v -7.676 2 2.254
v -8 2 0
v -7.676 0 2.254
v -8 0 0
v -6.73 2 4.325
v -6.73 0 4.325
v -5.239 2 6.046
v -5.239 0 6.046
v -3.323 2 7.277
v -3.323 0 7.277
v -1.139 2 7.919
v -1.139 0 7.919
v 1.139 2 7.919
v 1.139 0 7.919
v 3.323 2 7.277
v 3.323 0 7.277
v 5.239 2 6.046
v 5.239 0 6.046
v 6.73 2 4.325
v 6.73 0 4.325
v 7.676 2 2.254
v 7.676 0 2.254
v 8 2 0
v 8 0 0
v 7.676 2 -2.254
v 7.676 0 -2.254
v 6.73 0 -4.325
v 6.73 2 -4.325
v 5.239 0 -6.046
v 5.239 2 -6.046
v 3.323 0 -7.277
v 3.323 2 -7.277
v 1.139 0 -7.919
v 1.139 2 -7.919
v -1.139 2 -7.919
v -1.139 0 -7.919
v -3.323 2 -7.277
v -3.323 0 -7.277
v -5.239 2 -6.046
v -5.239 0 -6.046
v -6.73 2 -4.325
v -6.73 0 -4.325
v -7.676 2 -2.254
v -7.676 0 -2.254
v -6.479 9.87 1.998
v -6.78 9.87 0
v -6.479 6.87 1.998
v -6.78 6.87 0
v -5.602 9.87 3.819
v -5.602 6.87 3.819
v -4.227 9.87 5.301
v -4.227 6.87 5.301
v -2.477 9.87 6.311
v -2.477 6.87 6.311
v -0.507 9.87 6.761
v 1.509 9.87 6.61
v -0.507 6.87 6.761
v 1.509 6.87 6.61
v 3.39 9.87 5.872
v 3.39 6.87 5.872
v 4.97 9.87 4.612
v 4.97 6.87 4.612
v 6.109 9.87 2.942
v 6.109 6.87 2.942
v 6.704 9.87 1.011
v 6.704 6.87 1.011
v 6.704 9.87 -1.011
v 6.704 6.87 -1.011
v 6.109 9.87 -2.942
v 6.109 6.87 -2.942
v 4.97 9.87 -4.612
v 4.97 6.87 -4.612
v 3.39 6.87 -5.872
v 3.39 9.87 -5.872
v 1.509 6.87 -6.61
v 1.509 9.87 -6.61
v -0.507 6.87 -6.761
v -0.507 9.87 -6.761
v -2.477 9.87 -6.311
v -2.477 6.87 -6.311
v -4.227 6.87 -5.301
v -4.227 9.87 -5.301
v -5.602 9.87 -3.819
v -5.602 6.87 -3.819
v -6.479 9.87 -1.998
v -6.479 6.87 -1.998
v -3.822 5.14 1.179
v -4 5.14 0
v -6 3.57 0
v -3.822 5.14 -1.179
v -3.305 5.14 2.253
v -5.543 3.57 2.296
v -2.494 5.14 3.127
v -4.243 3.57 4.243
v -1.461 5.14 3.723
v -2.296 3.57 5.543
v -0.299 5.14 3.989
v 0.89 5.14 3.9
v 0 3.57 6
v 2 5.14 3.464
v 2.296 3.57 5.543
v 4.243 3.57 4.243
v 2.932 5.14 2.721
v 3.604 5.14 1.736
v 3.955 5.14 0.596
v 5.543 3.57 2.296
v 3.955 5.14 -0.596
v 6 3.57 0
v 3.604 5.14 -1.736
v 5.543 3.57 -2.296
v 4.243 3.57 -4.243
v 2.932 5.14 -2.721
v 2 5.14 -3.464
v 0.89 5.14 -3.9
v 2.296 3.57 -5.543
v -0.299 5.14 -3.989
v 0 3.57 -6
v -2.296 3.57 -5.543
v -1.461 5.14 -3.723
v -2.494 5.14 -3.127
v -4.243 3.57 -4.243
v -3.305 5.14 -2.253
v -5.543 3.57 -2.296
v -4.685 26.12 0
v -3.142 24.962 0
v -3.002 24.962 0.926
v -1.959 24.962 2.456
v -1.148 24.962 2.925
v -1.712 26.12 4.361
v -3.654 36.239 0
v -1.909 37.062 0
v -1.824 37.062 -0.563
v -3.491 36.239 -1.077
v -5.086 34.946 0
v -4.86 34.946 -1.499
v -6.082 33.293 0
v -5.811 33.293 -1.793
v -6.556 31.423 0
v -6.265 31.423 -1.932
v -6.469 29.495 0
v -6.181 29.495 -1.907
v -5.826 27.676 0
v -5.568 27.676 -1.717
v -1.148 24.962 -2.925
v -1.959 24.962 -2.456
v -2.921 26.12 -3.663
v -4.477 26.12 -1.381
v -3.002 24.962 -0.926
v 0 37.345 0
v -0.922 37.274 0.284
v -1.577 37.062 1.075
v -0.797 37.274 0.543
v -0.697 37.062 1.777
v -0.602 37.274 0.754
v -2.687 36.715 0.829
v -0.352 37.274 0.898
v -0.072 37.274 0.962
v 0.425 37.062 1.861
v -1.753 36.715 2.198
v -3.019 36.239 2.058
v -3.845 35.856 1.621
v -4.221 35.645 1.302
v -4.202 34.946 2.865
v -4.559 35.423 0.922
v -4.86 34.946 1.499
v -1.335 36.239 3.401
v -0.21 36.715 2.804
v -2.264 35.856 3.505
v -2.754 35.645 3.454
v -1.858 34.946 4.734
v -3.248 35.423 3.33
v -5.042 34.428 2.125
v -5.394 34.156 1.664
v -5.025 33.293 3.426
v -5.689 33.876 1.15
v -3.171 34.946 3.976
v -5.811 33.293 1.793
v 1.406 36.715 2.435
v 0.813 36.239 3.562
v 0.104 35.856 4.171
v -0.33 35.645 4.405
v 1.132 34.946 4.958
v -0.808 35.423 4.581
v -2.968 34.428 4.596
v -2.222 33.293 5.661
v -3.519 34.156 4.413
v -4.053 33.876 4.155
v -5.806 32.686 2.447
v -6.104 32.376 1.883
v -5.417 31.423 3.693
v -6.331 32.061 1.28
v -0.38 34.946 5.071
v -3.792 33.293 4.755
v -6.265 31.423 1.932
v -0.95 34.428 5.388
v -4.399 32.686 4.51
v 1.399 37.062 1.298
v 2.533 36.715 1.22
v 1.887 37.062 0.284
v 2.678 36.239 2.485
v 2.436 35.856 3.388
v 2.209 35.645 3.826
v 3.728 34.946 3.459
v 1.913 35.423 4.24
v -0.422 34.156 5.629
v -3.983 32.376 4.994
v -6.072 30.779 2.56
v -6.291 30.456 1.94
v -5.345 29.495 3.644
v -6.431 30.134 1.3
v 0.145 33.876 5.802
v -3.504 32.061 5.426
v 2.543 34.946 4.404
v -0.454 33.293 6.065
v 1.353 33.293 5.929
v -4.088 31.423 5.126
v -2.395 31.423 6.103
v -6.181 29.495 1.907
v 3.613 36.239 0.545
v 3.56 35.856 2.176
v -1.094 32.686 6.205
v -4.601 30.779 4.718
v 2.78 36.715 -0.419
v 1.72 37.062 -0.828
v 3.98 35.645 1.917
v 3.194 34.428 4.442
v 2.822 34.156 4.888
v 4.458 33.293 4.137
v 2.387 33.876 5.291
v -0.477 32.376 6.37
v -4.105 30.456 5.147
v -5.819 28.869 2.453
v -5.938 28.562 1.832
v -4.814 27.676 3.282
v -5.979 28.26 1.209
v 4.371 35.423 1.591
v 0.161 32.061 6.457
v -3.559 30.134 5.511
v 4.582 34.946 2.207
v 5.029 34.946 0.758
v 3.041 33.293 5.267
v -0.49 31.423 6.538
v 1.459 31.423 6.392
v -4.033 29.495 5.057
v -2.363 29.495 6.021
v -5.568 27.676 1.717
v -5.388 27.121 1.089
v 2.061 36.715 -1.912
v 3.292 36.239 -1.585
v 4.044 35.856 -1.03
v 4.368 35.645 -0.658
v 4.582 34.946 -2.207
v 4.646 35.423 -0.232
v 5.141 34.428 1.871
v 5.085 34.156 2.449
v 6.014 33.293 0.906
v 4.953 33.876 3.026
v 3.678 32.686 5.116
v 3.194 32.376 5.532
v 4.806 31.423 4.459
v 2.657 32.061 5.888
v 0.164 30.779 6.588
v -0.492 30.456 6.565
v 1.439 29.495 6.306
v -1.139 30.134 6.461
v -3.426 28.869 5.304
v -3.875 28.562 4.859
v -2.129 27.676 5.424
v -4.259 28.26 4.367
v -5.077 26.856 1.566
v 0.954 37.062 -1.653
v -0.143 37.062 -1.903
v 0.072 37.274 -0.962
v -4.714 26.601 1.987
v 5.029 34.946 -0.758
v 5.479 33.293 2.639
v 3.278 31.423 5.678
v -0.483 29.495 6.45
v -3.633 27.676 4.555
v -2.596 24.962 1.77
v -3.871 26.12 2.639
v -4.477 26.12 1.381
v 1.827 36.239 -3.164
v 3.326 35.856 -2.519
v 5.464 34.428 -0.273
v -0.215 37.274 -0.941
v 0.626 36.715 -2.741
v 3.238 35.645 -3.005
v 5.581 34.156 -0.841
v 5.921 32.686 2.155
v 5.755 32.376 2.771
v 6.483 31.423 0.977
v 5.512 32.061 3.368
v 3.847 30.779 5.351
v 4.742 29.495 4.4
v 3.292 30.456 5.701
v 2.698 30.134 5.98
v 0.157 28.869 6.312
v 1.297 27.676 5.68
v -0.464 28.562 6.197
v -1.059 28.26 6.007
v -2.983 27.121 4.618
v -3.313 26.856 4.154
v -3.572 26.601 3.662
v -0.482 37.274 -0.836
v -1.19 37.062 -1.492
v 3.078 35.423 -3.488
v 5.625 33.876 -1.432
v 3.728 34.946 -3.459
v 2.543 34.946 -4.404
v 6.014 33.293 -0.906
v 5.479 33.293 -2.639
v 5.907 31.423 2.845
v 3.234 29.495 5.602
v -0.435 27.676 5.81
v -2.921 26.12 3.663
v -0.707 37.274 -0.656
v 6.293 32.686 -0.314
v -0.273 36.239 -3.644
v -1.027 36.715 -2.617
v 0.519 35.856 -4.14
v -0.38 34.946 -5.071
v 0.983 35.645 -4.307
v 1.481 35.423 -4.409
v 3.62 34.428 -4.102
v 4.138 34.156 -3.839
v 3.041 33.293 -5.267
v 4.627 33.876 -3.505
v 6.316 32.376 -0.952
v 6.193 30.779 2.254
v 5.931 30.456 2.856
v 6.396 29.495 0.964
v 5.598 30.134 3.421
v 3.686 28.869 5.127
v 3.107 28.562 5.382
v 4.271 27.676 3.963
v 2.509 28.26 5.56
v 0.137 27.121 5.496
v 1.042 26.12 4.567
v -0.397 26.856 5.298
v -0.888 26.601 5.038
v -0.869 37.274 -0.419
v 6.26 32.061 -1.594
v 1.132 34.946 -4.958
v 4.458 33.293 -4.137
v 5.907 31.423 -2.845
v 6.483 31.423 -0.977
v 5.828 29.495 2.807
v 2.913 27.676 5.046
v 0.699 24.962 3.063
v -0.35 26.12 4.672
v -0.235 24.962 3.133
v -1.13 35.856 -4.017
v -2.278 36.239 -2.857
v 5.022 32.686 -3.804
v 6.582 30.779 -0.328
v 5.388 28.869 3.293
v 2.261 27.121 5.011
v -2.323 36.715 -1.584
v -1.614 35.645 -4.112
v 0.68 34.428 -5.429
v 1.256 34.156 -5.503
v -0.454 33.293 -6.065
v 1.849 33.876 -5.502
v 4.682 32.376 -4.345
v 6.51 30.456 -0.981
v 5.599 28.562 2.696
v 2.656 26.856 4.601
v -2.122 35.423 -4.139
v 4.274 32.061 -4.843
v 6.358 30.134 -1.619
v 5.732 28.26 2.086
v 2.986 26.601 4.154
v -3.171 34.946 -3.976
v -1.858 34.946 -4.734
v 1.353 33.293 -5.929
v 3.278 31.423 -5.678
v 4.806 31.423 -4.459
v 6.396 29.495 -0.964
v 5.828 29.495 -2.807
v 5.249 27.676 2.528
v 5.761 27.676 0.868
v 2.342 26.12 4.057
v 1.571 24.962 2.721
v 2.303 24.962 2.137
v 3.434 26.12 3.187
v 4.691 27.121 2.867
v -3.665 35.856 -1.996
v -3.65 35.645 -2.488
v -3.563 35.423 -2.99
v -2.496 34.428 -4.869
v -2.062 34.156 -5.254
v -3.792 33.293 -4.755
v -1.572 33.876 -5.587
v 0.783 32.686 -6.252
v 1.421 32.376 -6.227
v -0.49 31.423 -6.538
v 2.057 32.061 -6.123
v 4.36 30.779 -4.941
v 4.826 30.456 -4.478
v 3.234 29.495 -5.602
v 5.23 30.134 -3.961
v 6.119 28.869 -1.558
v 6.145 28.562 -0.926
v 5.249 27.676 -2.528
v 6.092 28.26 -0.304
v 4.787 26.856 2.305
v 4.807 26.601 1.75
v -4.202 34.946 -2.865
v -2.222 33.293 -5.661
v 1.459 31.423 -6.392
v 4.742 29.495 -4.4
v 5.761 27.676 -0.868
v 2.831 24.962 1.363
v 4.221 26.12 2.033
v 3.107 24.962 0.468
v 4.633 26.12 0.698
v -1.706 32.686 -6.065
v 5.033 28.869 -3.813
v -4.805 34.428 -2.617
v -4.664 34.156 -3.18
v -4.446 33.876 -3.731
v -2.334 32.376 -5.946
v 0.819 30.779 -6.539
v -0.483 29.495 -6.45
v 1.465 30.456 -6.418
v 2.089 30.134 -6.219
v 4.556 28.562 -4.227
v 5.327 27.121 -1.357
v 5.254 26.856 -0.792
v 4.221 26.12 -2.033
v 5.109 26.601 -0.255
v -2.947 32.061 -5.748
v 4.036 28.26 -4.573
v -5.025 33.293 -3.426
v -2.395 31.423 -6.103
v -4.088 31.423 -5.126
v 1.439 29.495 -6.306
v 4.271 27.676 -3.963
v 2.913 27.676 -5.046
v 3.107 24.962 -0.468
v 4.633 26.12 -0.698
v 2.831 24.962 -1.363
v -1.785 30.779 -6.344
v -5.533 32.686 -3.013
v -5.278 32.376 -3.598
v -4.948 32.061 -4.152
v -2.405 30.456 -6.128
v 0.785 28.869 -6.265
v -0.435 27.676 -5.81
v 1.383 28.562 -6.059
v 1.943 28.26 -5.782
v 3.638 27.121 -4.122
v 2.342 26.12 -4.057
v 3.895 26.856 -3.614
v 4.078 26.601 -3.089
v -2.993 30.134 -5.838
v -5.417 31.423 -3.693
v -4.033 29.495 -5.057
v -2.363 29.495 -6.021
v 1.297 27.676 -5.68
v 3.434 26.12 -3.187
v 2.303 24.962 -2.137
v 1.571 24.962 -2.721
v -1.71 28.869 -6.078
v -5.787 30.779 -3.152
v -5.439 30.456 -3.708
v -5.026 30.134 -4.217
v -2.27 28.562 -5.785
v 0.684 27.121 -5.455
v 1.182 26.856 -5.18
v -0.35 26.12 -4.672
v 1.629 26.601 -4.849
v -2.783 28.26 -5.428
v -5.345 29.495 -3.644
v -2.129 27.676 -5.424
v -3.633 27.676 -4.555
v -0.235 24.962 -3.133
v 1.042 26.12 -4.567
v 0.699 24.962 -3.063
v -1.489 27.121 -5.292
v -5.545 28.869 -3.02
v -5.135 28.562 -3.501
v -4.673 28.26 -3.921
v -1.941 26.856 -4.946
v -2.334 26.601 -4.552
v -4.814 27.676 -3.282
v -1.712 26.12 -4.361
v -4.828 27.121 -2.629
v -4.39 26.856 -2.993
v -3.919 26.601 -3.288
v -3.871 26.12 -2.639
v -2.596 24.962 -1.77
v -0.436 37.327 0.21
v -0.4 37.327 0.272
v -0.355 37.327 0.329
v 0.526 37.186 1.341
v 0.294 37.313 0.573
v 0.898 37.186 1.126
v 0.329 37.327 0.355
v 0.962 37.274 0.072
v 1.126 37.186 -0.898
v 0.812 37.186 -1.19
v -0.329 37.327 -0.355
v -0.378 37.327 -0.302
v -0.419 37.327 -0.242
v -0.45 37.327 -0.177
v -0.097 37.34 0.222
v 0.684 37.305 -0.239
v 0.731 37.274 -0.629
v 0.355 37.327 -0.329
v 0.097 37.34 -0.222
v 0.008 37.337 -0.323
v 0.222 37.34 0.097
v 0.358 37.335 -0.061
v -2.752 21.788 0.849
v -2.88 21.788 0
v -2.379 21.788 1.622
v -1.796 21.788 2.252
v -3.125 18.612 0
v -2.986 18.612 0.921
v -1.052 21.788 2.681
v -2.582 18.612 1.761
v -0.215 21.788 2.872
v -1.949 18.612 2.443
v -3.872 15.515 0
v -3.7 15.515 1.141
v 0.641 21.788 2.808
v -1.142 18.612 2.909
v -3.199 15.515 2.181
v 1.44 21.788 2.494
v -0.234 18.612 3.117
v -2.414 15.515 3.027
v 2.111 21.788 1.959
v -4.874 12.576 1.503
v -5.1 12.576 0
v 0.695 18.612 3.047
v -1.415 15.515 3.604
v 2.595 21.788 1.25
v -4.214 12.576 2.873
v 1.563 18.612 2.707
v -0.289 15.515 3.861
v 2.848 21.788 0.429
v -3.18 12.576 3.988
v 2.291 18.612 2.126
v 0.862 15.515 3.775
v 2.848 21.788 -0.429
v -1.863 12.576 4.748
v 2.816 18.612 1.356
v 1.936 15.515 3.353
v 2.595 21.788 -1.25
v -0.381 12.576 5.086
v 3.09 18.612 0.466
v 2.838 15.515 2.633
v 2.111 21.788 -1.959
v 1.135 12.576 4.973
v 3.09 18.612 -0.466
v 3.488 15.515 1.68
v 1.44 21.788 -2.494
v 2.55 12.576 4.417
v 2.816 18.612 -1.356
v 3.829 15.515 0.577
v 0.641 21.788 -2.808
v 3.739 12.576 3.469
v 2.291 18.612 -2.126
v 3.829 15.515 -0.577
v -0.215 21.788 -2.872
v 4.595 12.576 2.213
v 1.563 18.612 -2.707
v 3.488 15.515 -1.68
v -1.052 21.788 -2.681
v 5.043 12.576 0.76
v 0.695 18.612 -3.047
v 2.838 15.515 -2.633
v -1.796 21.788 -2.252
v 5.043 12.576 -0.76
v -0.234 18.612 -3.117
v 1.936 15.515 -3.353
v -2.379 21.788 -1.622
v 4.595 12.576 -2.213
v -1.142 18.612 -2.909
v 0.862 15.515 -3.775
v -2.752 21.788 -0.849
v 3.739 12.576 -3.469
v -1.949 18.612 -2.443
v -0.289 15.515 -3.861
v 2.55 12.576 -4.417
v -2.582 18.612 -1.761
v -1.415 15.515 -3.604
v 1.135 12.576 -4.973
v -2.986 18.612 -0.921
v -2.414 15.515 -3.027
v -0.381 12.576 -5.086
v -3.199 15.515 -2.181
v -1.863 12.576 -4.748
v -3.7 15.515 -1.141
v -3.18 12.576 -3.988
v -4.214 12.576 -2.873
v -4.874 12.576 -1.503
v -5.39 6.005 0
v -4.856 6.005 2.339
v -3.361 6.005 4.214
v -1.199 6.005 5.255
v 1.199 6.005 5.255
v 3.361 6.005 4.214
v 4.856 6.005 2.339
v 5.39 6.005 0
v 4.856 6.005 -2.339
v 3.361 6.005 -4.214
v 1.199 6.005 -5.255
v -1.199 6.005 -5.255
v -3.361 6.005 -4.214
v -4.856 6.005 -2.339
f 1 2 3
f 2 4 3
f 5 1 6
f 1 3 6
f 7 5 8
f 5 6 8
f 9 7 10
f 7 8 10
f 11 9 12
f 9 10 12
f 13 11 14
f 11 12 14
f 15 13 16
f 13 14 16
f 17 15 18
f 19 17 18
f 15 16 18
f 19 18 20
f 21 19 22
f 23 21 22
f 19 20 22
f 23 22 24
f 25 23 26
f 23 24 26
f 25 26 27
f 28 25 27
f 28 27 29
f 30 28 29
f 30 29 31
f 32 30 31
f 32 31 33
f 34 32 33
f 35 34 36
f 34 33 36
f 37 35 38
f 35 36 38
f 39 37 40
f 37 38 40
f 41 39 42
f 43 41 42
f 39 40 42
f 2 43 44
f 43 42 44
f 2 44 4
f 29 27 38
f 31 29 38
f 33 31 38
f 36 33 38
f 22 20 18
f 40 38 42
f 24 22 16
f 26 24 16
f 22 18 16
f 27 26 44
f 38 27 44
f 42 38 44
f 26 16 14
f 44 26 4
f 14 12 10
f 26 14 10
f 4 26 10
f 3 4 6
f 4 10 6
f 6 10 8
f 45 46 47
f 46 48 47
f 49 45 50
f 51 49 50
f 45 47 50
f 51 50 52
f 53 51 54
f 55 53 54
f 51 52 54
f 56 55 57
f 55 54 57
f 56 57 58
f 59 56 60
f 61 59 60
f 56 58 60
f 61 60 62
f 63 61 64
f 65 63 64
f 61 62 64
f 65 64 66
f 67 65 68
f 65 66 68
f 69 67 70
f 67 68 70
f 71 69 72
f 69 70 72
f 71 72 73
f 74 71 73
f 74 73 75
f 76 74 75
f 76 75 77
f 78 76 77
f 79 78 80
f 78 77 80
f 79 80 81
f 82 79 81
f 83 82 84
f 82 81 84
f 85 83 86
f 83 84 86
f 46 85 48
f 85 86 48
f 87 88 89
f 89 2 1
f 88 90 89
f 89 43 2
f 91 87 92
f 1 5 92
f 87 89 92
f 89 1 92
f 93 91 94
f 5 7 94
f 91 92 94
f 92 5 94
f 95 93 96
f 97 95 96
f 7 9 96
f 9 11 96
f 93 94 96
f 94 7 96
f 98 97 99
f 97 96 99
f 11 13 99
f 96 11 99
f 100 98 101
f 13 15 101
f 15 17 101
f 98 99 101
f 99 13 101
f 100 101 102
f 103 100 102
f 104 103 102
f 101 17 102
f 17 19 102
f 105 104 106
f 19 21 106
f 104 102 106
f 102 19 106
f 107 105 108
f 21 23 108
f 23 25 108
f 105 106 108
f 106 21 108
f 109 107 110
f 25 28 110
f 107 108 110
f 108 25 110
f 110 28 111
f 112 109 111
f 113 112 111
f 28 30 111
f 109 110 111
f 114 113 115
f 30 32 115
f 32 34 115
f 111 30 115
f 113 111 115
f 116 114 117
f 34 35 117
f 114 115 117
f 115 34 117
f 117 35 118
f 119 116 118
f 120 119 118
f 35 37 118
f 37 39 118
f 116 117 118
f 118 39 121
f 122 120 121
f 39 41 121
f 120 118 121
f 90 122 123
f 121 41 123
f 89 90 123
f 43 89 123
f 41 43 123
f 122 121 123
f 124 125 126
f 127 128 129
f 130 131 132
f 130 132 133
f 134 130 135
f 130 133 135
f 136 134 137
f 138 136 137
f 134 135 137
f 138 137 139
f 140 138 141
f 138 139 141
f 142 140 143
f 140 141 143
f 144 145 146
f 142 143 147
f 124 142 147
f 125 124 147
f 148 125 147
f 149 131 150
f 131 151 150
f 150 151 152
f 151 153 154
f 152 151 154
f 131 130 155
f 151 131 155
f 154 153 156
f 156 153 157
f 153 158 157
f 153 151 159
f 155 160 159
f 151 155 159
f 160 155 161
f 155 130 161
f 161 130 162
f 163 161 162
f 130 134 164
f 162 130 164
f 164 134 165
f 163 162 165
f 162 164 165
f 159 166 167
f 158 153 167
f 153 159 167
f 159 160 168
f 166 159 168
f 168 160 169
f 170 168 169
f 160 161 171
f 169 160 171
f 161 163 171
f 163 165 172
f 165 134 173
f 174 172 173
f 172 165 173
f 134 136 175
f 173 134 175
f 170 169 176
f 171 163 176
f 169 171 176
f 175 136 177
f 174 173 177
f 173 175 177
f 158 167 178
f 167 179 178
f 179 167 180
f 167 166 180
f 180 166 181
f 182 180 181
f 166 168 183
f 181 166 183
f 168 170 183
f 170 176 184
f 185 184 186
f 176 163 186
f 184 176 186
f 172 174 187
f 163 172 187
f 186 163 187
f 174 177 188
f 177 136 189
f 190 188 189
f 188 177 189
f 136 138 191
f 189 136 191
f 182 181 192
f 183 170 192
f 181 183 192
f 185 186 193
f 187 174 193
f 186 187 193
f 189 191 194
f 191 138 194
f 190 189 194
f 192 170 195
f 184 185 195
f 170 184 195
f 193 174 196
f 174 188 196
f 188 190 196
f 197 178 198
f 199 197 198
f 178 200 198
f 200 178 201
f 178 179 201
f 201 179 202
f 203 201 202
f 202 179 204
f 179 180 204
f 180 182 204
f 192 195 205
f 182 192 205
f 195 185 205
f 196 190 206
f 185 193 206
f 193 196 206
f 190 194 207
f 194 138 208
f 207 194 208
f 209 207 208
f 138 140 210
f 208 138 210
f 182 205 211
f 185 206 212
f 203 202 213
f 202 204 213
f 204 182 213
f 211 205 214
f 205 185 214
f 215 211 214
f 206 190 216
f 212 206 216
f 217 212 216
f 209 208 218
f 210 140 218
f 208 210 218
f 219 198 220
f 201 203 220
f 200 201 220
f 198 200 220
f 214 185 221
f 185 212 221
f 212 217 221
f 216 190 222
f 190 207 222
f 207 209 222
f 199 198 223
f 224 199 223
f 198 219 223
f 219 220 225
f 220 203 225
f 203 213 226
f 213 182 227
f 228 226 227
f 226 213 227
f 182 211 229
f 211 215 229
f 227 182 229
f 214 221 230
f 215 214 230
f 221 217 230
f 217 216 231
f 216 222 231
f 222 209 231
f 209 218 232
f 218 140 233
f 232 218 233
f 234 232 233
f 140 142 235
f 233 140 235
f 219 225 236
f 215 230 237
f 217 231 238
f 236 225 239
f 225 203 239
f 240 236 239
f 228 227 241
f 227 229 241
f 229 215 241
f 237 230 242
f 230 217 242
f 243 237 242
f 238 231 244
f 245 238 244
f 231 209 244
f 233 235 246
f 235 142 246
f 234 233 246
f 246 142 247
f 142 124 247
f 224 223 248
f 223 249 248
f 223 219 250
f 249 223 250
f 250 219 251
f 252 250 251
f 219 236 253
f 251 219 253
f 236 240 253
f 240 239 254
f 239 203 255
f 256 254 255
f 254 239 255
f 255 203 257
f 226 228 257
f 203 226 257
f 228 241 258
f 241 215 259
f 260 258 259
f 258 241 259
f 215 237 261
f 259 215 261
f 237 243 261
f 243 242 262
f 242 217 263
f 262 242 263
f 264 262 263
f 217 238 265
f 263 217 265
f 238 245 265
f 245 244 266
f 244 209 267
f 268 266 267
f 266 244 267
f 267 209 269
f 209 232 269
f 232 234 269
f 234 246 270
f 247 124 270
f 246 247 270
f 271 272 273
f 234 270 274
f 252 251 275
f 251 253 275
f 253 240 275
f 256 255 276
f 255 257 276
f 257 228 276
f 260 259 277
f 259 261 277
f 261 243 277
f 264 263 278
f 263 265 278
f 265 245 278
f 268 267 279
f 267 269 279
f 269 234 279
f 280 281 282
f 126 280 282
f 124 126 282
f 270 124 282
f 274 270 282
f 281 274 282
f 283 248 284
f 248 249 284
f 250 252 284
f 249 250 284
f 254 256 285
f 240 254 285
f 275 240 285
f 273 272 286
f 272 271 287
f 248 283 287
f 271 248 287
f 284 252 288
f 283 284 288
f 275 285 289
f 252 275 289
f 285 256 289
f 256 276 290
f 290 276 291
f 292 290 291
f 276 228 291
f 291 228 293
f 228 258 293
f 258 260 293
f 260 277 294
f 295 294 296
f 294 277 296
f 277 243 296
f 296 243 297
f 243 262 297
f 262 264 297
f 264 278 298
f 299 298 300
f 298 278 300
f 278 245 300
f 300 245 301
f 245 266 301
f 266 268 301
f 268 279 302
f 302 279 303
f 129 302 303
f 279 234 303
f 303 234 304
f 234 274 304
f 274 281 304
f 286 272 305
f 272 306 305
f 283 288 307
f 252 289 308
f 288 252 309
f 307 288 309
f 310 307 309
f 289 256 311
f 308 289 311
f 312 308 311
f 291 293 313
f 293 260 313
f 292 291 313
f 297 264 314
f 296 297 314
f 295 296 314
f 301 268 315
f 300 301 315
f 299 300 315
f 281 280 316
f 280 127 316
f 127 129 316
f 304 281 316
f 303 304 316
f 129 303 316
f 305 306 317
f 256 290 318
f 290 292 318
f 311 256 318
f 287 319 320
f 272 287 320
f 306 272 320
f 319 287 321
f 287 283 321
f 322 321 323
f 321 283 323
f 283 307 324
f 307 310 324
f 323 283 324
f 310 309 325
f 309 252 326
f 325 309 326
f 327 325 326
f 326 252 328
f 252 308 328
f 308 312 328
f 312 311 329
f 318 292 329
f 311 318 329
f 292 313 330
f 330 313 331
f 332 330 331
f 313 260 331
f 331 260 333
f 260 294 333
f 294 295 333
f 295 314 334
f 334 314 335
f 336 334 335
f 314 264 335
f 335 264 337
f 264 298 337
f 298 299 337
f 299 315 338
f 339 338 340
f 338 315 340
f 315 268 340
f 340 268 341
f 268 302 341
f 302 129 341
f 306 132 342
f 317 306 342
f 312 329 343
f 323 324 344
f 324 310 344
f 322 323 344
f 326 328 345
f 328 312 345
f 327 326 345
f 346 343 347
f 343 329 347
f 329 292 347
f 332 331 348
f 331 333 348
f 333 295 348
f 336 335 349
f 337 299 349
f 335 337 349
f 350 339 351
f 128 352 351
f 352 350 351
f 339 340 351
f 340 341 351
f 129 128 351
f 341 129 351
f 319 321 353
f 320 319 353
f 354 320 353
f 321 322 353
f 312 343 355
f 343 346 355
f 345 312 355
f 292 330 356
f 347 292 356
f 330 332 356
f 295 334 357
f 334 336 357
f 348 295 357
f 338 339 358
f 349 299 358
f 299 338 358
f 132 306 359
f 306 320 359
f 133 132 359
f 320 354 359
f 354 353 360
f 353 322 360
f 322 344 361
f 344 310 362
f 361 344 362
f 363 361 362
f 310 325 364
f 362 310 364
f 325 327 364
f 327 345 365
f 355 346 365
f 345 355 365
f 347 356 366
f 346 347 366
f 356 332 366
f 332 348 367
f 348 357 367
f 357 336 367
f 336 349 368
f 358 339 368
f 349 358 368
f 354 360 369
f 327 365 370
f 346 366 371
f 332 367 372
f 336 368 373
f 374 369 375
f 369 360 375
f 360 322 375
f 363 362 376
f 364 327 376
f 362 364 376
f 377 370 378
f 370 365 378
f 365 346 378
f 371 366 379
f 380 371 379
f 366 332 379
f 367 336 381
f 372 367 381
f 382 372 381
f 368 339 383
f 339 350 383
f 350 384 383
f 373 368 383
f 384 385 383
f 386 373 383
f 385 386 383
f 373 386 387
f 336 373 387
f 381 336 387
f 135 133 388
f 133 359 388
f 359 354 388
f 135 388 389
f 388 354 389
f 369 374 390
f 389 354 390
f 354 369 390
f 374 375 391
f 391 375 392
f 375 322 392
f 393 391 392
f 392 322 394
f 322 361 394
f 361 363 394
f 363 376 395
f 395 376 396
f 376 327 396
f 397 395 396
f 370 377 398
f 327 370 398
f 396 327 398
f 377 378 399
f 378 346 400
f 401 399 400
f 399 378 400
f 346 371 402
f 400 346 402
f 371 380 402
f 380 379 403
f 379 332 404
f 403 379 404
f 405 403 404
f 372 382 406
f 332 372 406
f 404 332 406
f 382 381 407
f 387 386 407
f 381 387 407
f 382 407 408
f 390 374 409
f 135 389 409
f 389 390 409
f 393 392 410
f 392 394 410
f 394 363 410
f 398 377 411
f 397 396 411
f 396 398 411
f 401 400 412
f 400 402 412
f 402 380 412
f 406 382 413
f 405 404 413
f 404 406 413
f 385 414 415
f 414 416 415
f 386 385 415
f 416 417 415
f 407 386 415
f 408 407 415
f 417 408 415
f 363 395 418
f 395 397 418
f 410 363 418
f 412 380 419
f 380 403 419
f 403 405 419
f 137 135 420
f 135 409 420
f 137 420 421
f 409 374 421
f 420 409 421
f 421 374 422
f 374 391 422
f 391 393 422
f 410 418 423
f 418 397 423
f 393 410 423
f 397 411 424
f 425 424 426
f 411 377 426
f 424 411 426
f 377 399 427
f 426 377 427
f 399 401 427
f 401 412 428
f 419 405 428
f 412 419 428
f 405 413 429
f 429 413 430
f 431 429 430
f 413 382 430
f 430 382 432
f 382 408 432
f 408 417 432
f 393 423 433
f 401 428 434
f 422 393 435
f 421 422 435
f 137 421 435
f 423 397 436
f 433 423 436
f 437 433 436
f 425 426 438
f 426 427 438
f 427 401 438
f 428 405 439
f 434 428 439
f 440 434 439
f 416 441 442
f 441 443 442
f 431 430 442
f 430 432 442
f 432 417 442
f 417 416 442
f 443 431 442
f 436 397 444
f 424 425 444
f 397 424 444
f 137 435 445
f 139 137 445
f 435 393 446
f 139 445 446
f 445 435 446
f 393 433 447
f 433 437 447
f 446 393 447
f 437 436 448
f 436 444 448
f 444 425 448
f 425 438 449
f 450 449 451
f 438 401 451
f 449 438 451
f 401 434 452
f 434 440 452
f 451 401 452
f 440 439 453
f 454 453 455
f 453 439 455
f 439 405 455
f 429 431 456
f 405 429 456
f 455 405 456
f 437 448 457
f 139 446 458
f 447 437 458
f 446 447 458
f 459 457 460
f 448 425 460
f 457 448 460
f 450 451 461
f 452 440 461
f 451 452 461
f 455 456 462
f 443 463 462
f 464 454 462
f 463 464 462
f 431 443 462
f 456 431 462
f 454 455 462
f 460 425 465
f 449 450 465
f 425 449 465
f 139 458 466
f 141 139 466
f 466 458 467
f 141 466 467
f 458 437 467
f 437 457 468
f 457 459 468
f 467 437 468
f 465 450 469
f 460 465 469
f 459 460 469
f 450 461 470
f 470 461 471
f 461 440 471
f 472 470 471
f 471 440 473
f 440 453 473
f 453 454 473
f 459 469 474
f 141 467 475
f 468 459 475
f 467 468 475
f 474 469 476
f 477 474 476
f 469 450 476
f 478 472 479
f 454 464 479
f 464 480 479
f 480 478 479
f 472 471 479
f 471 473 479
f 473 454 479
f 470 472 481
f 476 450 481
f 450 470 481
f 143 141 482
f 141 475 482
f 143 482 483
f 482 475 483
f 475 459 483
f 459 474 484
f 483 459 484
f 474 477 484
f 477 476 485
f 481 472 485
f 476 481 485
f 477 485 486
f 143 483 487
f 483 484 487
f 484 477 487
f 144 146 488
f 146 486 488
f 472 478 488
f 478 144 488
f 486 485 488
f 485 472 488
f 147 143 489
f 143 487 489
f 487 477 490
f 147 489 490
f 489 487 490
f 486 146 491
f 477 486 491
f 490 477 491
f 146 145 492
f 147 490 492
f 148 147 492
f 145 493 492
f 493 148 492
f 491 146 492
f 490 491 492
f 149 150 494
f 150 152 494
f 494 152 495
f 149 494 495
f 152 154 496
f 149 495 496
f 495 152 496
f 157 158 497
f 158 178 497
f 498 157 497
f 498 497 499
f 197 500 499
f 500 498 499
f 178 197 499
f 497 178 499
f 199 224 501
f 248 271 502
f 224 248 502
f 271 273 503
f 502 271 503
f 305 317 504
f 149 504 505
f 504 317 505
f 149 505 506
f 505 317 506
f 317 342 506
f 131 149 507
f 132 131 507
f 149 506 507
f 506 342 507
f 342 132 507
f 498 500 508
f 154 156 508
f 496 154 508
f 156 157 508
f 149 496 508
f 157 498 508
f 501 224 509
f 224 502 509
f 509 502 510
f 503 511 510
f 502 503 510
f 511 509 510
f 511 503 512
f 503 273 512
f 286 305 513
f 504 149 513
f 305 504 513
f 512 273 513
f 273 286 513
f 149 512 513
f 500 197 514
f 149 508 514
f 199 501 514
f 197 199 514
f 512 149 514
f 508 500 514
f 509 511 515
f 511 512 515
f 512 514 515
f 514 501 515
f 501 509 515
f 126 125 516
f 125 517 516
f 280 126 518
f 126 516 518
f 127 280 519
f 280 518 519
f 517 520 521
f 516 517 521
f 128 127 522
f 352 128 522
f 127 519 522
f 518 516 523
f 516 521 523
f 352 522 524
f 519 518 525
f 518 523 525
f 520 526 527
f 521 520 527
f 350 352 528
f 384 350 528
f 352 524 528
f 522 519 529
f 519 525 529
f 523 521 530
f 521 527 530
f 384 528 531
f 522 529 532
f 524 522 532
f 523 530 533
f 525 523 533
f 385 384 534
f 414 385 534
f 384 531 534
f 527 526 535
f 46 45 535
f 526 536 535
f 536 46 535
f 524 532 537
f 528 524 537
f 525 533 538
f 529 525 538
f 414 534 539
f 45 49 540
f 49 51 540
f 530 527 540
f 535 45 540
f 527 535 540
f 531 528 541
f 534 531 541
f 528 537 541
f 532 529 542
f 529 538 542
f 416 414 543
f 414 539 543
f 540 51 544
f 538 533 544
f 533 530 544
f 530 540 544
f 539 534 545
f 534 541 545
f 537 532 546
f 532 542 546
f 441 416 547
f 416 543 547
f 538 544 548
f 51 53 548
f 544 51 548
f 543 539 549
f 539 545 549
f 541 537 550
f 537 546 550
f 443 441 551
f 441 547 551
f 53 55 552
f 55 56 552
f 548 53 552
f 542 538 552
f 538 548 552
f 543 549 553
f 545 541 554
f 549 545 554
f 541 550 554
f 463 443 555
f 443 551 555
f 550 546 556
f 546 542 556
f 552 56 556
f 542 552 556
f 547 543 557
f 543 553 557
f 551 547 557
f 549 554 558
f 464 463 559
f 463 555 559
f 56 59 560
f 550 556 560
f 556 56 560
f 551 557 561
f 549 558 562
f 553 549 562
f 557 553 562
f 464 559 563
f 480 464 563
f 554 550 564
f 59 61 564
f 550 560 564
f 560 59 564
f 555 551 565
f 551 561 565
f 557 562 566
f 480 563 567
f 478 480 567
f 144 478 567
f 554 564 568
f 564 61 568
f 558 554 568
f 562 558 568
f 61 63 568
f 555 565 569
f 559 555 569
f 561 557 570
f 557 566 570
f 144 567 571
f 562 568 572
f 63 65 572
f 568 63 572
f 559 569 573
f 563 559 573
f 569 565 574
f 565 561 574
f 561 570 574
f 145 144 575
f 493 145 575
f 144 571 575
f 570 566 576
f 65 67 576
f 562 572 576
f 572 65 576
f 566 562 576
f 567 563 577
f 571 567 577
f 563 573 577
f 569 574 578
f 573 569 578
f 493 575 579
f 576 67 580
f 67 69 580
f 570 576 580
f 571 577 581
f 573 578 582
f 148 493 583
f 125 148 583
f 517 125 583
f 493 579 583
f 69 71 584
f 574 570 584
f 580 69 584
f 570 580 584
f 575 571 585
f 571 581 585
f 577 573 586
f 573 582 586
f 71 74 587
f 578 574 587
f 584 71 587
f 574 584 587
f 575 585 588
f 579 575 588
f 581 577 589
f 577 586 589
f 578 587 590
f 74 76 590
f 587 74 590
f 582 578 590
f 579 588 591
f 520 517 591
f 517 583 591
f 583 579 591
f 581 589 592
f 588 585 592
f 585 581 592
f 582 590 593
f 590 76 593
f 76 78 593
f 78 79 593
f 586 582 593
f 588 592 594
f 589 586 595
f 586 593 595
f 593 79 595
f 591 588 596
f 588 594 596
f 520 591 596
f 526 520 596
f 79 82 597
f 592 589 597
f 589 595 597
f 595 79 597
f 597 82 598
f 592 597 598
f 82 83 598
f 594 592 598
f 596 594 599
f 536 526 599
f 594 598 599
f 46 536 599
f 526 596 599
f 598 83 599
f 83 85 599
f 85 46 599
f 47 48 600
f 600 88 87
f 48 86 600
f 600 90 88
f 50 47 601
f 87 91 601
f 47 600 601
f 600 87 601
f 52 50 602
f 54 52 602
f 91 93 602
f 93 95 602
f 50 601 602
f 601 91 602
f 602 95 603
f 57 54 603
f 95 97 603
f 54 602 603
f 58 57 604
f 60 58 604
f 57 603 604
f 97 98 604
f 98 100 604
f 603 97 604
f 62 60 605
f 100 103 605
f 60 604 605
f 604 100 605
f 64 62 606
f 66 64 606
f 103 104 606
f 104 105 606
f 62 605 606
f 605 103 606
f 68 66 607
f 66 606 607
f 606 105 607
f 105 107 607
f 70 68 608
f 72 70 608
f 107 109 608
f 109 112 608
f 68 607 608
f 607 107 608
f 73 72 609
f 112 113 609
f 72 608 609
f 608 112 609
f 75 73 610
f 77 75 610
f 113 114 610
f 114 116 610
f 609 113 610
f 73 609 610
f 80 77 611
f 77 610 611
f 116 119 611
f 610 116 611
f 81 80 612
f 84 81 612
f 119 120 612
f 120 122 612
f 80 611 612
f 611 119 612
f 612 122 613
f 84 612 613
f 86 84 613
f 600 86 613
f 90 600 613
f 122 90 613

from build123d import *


with BuildPart() as f1:
    # F0 (on Top) → F1 (revolve)
    with BuildSketch(Plane.XY):
        with BuildLine():
            Line((-8, 0), (0, 0))
            Line((0, 0), (0, 37.344937))
            ThreePointArc((0, 37.344937), (-6.387622, 32.375548), (-3.141686, 24.962018))
            ThreePointArc((-3.141686, 24.962018), (-3.436771, 17.048593), (-6.78, 9.87))
            Line((-6.78, 9.87), (-6.78, 6.87))
            Line((-6.78, 6.87), (-4, 5.14))
            Line((-4, 5.14), (-8, 2))
            Line((-8, 2), (-8, 0))
        make_face()
    revolve(axis=Axis((0, 18.672468, 0), (0, 1, 0)))


solid = f1.part
